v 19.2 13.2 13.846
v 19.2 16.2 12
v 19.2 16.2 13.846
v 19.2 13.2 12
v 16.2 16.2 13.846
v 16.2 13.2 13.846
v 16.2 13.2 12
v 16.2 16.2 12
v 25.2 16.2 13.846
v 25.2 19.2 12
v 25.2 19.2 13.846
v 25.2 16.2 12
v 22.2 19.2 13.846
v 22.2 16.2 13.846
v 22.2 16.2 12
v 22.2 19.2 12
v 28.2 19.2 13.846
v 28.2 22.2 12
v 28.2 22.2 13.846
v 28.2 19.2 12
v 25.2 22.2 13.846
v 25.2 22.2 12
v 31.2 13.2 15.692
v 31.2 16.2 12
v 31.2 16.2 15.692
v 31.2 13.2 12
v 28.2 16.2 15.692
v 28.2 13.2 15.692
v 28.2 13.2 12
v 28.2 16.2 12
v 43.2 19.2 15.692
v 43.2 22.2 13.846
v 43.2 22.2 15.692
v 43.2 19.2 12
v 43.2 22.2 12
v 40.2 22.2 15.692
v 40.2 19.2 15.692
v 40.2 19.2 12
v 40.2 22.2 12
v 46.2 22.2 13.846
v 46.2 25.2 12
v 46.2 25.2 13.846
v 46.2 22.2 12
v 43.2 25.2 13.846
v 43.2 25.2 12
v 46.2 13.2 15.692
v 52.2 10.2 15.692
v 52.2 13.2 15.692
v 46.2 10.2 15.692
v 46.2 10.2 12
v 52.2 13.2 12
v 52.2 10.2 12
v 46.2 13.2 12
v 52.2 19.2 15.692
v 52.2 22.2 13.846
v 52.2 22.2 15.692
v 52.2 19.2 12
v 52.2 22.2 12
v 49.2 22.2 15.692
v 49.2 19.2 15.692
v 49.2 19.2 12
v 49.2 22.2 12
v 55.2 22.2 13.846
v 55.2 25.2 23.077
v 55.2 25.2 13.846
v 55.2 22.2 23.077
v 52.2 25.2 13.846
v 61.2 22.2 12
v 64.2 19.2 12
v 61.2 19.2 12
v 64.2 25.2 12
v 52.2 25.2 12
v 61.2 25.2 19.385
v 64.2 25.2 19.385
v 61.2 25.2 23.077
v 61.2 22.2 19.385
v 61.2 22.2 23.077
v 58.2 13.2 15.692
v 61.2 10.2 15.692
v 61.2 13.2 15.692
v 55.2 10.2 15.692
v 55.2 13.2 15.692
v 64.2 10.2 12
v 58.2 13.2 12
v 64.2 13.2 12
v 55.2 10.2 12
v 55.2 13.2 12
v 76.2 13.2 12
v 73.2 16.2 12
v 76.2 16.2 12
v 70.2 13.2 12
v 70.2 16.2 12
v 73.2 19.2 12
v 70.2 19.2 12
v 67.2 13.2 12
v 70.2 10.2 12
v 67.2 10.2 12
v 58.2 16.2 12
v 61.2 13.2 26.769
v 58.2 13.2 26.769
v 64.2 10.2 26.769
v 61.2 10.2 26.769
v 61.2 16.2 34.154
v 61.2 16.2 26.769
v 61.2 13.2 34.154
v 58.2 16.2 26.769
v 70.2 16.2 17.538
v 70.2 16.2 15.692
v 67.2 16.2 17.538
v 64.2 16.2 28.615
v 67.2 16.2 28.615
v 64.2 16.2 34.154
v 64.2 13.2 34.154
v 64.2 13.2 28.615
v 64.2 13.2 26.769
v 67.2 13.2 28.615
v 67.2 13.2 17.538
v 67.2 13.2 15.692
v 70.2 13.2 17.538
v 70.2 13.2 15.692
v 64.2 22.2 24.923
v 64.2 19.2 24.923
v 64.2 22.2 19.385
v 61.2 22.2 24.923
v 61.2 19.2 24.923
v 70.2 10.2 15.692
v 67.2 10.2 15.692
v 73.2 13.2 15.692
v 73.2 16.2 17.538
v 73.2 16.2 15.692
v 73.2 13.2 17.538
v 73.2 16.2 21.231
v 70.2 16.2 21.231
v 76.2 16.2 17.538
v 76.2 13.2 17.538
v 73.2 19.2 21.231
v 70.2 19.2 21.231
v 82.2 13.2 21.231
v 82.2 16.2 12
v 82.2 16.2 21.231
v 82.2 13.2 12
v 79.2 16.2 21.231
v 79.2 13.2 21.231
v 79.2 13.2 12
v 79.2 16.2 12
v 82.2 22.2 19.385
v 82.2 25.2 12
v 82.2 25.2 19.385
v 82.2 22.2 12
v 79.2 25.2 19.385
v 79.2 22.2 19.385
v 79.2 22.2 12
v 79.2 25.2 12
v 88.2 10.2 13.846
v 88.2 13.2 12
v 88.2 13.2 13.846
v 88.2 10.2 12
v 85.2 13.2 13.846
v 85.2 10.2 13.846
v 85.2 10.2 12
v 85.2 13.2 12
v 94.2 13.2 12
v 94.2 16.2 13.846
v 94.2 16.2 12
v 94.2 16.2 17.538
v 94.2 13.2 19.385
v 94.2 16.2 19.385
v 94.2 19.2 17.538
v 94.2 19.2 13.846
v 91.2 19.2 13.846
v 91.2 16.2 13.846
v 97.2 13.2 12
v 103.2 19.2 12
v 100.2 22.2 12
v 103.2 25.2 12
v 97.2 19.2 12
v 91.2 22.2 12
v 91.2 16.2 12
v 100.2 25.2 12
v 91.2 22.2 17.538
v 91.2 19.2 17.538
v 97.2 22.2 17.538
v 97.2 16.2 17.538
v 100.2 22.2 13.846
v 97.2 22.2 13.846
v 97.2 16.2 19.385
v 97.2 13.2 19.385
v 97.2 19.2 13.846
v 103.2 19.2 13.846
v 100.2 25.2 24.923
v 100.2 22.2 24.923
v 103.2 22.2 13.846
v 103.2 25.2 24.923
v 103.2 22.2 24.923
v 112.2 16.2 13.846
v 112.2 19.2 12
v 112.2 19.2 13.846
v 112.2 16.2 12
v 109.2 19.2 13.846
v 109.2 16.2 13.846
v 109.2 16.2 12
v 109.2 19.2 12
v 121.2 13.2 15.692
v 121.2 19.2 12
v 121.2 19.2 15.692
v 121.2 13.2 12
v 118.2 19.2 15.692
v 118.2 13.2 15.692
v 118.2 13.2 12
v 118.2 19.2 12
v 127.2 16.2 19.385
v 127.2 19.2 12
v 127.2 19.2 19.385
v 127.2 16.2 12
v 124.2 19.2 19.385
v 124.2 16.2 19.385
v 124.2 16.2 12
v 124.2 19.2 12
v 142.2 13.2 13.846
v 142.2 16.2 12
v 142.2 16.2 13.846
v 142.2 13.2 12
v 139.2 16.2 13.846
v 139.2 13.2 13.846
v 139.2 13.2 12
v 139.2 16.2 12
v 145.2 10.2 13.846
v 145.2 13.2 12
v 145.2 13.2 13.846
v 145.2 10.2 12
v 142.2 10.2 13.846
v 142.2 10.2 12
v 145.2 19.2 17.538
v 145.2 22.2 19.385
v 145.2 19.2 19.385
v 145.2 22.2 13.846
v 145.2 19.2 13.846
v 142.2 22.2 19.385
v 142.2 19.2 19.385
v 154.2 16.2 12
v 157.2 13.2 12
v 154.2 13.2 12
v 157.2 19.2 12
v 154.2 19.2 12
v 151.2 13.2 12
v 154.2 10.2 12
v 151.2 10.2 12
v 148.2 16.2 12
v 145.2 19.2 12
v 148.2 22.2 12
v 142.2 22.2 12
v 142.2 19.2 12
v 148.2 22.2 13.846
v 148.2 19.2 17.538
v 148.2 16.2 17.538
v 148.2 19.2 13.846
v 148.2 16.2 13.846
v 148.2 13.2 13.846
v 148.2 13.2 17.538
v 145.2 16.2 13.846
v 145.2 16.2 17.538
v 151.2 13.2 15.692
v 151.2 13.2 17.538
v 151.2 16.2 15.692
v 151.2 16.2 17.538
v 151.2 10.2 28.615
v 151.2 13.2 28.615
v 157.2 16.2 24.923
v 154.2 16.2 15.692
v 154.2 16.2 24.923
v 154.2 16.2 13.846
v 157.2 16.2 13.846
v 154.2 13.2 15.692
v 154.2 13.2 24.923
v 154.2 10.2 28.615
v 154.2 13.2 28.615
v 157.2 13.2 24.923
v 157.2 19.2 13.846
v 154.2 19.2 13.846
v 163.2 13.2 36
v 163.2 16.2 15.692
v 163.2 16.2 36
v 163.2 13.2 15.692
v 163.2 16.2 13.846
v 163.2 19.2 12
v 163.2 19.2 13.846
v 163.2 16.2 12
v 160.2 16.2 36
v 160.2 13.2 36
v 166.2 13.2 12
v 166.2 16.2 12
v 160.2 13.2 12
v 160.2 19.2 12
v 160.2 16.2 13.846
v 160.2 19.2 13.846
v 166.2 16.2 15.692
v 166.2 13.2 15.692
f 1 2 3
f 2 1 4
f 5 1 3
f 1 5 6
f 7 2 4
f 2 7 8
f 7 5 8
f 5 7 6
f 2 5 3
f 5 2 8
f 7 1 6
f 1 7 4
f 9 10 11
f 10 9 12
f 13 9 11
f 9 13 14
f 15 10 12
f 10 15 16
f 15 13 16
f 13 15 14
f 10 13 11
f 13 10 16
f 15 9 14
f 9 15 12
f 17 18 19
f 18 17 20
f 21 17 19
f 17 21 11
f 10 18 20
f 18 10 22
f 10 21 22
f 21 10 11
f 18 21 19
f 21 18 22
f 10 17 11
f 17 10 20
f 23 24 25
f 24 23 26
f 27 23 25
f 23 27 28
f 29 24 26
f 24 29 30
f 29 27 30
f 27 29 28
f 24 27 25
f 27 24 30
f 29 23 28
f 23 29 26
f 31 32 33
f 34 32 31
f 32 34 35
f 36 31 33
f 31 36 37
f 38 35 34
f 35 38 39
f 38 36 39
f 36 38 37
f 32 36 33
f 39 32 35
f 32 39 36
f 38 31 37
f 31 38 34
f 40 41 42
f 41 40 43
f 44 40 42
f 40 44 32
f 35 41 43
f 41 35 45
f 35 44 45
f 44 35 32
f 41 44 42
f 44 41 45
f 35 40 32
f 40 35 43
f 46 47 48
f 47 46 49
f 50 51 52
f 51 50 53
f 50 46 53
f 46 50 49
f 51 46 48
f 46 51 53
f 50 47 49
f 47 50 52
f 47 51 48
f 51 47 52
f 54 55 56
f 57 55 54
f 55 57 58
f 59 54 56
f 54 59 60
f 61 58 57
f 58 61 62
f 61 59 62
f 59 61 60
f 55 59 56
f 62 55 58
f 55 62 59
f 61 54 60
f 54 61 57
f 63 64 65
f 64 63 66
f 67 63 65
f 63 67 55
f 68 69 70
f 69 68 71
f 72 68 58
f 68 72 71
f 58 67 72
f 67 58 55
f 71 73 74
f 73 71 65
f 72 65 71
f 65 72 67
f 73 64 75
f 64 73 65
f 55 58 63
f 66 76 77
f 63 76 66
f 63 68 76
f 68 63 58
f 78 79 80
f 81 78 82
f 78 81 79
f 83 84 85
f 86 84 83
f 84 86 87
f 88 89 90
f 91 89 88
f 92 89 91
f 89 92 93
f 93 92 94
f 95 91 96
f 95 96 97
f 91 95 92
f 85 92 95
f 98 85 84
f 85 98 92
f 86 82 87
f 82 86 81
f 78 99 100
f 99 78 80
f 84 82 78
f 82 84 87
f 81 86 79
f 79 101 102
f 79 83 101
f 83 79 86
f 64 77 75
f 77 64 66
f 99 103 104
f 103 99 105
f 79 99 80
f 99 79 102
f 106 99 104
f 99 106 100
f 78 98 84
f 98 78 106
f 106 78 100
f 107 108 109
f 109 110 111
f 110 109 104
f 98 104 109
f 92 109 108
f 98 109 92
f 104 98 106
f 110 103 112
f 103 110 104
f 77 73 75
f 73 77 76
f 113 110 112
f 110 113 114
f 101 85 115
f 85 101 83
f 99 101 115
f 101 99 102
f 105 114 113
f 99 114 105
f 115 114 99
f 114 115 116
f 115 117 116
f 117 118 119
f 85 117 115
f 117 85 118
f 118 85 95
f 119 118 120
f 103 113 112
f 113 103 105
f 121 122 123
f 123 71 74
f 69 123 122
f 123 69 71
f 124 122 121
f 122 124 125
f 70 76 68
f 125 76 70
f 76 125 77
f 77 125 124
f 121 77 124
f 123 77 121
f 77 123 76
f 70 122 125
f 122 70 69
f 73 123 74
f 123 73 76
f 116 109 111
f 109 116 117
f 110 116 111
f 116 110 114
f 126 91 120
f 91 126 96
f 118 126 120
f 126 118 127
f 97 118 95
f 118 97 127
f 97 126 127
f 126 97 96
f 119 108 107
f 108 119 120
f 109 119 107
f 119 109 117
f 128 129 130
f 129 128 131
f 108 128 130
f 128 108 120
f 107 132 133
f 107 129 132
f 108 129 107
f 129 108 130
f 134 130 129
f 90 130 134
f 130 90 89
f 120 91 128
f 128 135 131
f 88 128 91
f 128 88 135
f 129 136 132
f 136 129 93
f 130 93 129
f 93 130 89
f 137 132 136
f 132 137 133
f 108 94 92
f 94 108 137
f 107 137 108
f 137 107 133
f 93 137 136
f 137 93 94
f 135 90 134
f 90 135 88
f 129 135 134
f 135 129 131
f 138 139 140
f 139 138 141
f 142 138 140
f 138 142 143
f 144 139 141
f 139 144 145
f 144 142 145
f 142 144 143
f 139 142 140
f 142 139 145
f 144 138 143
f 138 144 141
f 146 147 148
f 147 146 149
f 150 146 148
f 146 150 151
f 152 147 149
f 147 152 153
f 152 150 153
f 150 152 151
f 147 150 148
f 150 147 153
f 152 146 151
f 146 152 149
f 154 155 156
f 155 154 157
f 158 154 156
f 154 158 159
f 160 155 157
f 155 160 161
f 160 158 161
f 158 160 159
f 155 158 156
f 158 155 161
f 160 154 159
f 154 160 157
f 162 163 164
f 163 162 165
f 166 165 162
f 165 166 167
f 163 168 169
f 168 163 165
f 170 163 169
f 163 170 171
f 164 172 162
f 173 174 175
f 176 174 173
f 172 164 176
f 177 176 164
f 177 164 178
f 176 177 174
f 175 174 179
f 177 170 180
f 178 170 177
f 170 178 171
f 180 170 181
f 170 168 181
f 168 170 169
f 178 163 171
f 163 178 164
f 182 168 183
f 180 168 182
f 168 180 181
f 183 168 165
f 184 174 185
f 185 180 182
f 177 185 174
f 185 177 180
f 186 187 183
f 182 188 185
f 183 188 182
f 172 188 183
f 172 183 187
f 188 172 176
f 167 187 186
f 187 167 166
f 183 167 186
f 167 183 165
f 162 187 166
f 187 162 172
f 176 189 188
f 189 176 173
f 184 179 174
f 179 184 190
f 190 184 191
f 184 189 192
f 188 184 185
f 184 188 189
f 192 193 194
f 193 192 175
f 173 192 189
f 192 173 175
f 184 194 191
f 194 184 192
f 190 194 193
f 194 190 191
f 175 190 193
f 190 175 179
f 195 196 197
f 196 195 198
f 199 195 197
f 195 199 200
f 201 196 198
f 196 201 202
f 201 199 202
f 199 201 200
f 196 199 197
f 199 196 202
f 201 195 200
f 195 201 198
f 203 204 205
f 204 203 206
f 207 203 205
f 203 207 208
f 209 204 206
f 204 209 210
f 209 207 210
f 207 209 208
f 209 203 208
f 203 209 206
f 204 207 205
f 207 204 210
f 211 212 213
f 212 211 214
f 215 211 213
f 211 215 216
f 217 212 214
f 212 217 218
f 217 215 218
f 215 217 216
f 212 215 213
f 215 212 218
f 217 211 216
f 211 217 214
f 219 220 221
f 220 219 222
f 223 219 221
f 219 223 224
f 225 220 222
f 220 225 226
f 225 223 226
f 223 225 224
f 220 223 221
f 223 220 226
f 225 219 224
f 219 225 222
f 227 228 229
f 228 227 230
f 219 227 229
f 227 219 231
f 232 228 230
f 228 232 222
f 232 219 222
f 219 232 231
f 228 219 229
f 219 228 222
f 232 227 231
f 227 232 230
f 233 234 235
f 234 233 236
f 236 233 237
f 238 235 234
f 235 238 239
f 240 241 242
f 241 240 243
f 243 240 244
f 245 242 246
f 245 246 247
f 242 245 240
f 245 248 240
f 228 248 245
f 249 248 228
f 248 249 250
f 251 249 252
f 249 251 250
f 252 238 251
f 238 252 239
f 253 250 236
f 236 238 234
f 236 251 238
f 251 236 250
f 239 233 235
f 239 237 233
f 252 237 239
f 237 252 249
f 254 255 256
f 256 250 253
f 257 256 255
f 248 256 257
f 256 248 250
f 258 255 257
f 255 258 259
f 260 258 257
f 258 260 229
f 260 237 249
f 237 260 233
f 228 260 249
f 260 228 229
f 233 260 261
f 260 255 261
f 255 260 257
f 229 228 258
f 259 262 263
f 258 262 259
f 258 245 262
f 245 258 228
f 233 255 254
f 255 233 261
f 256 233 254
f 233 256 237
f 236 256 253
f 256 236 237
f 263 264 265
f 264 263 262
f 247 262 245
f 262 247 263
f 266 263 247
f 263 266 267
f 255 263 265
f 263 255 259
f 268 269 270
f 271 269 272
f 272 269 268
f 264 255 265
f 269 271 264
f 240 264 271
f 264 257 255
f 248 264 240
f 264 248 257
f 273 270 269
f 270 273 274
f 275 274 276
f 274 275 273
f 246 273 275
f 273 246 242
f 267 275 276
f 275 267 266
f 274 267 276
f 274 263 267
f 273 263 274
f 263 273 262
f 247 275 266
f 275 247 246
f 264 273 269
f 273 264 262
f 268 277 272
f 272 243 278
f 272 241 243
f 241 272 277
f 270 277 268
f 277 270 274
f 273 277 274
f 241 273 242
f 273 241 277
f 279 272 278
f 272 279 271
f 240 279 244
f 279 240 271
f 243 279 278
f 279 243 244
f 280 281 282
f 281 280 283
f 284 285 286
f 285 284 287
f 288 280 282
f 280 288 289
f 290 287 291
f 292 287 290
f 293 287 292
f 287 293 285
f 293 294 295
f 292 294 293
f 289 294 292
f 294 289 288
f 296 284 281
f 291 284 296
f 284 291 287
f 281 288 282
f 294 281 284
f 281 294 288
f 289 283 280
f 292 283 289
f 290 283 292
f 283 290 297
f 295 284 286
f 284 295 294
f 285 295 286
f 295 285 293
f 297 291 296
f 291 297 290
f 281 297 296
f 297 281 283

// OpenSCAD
union() {
	translate(v = [16.200000000000003, 13.200000000000001, 12.0]) {
		cube(size = [3.0, 3.0, 1.8461538461538463]);
	}
	translate(v = [22.200000000000003, 16.200000000000003, 12.0]) {
		cube(size = [3.0, 3.0, 1.8461538461538463]);
	}
	translate(v = [25.200000000000003, 19.200000000000003, 12.0]) {
		cube(size = [3.0, 3.0, 1.8461538461538463]);
	}
	translate(v = [28.200000000000003, 13.200000000000001, 12.0]) {
		cube(size = [3.0, 3.0, 3.6923076923076925]);
	}
	translate(v = [40.2, 19.200000000000003, 12.0]) {
		cube(size = [3.0, 3.0, 3.6923076923076925]);
	}
	translate(v = [43.2, 22.200000000000003, 12.0]) {
		cube(size = [3.0, 3.0, 1.8461538461538463]);
	}
	translate(v = [46.2, 10.200000000000001, 12.0]) {
		cube(size = [3.0, 3.0, 3.6923076923076925]);
	}
	translate(v = [49.2, 10.200000000000001, 12.0]) {
		cube(size = [3.0, 3.0, 3.6923076923076925]);
	}
	translate(v = [49.2, 19.200000000000003, 12.0]) {
		cube(size = [3.0, 3.0, 3.6923076923076925]);
	}
	translate(v = [52.2, 22.200000000000003, 12.0]) {
		cube(size = [3.0, 3.0, 1.8461538461538463]);
	}
	translate(v = [55.2, 10.200000000000001, 12.0]) {
		cube(size = [3.0, 3.0, 3.6923076923076925]);
	}
	translate(v = [55.2, 22.200000000000003, 12.0]) {
		cube(size = [3.0, 3.0, 11.076923076923077]);
	}
	translate(v = [58.2, 10.200000000000001, 12.0]) {
		cube(size = [3.0, 3.0, 3.6923076923076925]);
	}
	translate(v = [58.2, 13.200000000000001, 12.0]) {
		cube(size = [3.0, 3.0, 14.76923076923077]);
	}
	translate(v = [58.2, 22.200000000000003, 12.0]) {
		cube(size = [3.0, 3.0, 11.076923076923077]);
	}
	translate(v = [61.2, 10.200000000000001, 12.0]) {
		cube(size = [3.0, 3.0, 14.76923076923077]);
	}
	translate(v = [61.2, 13.200000000000001, 12.0]) {
		cube(size = [3.0, 3.0, 22.153846153846153]);
	}
	translate(v = [61.2, 19.200000000000003, 12.0]) {
		cube(size = [3.0, 3.0, 12.923076923076923]);
	}
	translate(v = [61.2, 22.200000000000003, 12.0]) {
		cube(size = [3.0, 3.0, 7.384615384615385]);
	}
	translate(v = [64.2, 13.200000000000001, 12.0]) {
		cube(size = [3.0, 3.0, 16.615384615384617]);
	}
	translate(v = [67.2, 10.200000000000001, 12.0]) {
		cube(size = [3.0, 3.0, 3.6923076923076925]);
	}
	translate(v = [67.2, 13.200000000000001, 12.0]) {
		cube(size = [3.0, 3.0, 5.538461538461538]);
	}
	translate(v = [70.2, 13.200000000000001, 12.0]) {
		cube(size = [3.0, 3.0, 3.6923076923076925]);
	}
	translate(v = [70.2, 16.200000000000003, 12.0]) {
		cube(size = [3.0, 3.0, 9.23076923076923]);
	}
	translate(v = [73.2, 13.200000000000001, 12.0]) {
		cube(size = [3.0, 3.0, 5.538461538461538]);
	}
	translate(v = [79.2, 13.200000000000001, 12.0]) {
		cube(size = [3.0, 3.0, 9.23076923076923]);
	}
	translate(v = [79.2, 22.200000000000003, 12.0]) {
		cube(size = [3.0, 3.0, 7.384615384615385]);
	}
	translate(v = [85.2, 10.200000000000001, 12.0]) {
		cube(size = [3.0, 3.0, 1.8461538461538463]);
	}
	translate(v = [91.2, 16.200000000000003, 12.0]) {
		cube(size = [3.0, 3.0, 1.8461538461538463]);
	}
	translate(v = [91.2, 19.200000000000003, 12.0]) {
		cube(size = [3.0, 3.0, 5.538461538461538]);
	}
	translate(v = [94.2, 13.200000000000001, 12.0]) {
		cube(size = [3.0, 3.0, 7.384615384615385]);
	}
	translate(v = [94.2, 16.200000000000003, 12.0]) {
		cube(size = [3.0, 3.0, 5.538461538461538]);
	}
	translate(v = [94.2, 19.200000000000003, 12.0]) {
		cube(size = [3.0, 3.0, 5.538461538461538]);
	}
	translate(v = [97.2, 19.200000000000003, 12.0]) {
		cube(size = [3.0, 3.0, 1.8461538461538463]);
	}
	translate(v = [100.2, 19.200000000000003, 12.0]) {
		cube(size = [3.0, 3.0, 1.8461538461538463]);
	}
	translate(v = [100.2, 22.200000000000003, 12.0]) {
		cube(size = [3.0, 3.0, 12.923076923076923]);
	}
	translate(v = [109.2, 16.200000000000003, 12.0]) {
		cube(size = [3.0, 3.0, 1.8461538461538463]);
	}
	translate(v = [118.2, 13.200000000000001, 12.0]) {
		cube(size = [3.0, 3.0, 3.6923076923076925]);
	}
	translate(v = [118.2, 16.200000000000003, 12.0]) {
		cube(size = [3.0, 3.0, 3.6923076923076925]);
	}
	translate(v = [124.2, 16.200000000000003, 12.0]) {
		cube(size = [3.0, 3.0, 7.384615384615385]);
	}
	translate(v = [139.2, 13.200000000000001, 12.0]) {
		cube(size = [3.0, 3.0, 1.8461538461538463]);
	}
	translate(v = [142.2, 10.200000000000001, 12.0]) {
		cube(size = [3.0, 3.0, 1.8461538461538463]);
	}
	translate(v = [142.2, 19.200000000000003, 12.0]) {
		cube(size = [3.0, 3.0, 7.384615384615385]);
	}
	translate(v = [145.2, 13.200000000000001, 12.0]) {
		cube(size = [3.0, 3.0, 1.8461538461538463]);
	}
	translate(v = [145.2, 16.200000000000003, 12.0]) {
		cube(size = [3.0, 3.0, 5.538461538461538]);
	}
	translate(v = [145.2, 19.200000000000003, 12.0]) {
		cube(size = [3.0, 3.0, 1.8461538461538463]);
	}
	translate(v = [148.2, 13.200000000000001, 12.0]) {
		cube(size = [3.0, 3.0, 5.538461538461538]);
	}
	translate(v = [151.2, 10.200000000000001, 12.0]) {
		cube(size = [3.0, 3.0, 16.615384615384617]);
	}
	translate(v = [151.2, 13.200000000000001, 12.0]) {
		cube(size = [3.0, 3.0, 3.6923076923076925]);
	}
	translate(v = [154.2, 13.200000000000001, 12.0]) {
		cube(size = [3.0, 3.0, 12.923076923076923]);
	}
	translate(v = [154.2, 16.200000000000003, 12.0]) {
		cube(size = [3.0, 3.0, 1.8461538461538463]);
	}
	translate(v = [160.2, 13.200000000000001, 12.0]) {
		cube(size = [3.0, 3.0, 24.0]);
	}
	translate(v = [160.2, 16.200000000000003, 12.0]) {
		cube(size = [3.0, 3.0, 1.8461538461538463]);
	}
	translate(v = [163.2, 13.200000000000001, 12.0]) {
		cube(size = [3.0, 3.0, 3.6923076923076925]);
	}
}
